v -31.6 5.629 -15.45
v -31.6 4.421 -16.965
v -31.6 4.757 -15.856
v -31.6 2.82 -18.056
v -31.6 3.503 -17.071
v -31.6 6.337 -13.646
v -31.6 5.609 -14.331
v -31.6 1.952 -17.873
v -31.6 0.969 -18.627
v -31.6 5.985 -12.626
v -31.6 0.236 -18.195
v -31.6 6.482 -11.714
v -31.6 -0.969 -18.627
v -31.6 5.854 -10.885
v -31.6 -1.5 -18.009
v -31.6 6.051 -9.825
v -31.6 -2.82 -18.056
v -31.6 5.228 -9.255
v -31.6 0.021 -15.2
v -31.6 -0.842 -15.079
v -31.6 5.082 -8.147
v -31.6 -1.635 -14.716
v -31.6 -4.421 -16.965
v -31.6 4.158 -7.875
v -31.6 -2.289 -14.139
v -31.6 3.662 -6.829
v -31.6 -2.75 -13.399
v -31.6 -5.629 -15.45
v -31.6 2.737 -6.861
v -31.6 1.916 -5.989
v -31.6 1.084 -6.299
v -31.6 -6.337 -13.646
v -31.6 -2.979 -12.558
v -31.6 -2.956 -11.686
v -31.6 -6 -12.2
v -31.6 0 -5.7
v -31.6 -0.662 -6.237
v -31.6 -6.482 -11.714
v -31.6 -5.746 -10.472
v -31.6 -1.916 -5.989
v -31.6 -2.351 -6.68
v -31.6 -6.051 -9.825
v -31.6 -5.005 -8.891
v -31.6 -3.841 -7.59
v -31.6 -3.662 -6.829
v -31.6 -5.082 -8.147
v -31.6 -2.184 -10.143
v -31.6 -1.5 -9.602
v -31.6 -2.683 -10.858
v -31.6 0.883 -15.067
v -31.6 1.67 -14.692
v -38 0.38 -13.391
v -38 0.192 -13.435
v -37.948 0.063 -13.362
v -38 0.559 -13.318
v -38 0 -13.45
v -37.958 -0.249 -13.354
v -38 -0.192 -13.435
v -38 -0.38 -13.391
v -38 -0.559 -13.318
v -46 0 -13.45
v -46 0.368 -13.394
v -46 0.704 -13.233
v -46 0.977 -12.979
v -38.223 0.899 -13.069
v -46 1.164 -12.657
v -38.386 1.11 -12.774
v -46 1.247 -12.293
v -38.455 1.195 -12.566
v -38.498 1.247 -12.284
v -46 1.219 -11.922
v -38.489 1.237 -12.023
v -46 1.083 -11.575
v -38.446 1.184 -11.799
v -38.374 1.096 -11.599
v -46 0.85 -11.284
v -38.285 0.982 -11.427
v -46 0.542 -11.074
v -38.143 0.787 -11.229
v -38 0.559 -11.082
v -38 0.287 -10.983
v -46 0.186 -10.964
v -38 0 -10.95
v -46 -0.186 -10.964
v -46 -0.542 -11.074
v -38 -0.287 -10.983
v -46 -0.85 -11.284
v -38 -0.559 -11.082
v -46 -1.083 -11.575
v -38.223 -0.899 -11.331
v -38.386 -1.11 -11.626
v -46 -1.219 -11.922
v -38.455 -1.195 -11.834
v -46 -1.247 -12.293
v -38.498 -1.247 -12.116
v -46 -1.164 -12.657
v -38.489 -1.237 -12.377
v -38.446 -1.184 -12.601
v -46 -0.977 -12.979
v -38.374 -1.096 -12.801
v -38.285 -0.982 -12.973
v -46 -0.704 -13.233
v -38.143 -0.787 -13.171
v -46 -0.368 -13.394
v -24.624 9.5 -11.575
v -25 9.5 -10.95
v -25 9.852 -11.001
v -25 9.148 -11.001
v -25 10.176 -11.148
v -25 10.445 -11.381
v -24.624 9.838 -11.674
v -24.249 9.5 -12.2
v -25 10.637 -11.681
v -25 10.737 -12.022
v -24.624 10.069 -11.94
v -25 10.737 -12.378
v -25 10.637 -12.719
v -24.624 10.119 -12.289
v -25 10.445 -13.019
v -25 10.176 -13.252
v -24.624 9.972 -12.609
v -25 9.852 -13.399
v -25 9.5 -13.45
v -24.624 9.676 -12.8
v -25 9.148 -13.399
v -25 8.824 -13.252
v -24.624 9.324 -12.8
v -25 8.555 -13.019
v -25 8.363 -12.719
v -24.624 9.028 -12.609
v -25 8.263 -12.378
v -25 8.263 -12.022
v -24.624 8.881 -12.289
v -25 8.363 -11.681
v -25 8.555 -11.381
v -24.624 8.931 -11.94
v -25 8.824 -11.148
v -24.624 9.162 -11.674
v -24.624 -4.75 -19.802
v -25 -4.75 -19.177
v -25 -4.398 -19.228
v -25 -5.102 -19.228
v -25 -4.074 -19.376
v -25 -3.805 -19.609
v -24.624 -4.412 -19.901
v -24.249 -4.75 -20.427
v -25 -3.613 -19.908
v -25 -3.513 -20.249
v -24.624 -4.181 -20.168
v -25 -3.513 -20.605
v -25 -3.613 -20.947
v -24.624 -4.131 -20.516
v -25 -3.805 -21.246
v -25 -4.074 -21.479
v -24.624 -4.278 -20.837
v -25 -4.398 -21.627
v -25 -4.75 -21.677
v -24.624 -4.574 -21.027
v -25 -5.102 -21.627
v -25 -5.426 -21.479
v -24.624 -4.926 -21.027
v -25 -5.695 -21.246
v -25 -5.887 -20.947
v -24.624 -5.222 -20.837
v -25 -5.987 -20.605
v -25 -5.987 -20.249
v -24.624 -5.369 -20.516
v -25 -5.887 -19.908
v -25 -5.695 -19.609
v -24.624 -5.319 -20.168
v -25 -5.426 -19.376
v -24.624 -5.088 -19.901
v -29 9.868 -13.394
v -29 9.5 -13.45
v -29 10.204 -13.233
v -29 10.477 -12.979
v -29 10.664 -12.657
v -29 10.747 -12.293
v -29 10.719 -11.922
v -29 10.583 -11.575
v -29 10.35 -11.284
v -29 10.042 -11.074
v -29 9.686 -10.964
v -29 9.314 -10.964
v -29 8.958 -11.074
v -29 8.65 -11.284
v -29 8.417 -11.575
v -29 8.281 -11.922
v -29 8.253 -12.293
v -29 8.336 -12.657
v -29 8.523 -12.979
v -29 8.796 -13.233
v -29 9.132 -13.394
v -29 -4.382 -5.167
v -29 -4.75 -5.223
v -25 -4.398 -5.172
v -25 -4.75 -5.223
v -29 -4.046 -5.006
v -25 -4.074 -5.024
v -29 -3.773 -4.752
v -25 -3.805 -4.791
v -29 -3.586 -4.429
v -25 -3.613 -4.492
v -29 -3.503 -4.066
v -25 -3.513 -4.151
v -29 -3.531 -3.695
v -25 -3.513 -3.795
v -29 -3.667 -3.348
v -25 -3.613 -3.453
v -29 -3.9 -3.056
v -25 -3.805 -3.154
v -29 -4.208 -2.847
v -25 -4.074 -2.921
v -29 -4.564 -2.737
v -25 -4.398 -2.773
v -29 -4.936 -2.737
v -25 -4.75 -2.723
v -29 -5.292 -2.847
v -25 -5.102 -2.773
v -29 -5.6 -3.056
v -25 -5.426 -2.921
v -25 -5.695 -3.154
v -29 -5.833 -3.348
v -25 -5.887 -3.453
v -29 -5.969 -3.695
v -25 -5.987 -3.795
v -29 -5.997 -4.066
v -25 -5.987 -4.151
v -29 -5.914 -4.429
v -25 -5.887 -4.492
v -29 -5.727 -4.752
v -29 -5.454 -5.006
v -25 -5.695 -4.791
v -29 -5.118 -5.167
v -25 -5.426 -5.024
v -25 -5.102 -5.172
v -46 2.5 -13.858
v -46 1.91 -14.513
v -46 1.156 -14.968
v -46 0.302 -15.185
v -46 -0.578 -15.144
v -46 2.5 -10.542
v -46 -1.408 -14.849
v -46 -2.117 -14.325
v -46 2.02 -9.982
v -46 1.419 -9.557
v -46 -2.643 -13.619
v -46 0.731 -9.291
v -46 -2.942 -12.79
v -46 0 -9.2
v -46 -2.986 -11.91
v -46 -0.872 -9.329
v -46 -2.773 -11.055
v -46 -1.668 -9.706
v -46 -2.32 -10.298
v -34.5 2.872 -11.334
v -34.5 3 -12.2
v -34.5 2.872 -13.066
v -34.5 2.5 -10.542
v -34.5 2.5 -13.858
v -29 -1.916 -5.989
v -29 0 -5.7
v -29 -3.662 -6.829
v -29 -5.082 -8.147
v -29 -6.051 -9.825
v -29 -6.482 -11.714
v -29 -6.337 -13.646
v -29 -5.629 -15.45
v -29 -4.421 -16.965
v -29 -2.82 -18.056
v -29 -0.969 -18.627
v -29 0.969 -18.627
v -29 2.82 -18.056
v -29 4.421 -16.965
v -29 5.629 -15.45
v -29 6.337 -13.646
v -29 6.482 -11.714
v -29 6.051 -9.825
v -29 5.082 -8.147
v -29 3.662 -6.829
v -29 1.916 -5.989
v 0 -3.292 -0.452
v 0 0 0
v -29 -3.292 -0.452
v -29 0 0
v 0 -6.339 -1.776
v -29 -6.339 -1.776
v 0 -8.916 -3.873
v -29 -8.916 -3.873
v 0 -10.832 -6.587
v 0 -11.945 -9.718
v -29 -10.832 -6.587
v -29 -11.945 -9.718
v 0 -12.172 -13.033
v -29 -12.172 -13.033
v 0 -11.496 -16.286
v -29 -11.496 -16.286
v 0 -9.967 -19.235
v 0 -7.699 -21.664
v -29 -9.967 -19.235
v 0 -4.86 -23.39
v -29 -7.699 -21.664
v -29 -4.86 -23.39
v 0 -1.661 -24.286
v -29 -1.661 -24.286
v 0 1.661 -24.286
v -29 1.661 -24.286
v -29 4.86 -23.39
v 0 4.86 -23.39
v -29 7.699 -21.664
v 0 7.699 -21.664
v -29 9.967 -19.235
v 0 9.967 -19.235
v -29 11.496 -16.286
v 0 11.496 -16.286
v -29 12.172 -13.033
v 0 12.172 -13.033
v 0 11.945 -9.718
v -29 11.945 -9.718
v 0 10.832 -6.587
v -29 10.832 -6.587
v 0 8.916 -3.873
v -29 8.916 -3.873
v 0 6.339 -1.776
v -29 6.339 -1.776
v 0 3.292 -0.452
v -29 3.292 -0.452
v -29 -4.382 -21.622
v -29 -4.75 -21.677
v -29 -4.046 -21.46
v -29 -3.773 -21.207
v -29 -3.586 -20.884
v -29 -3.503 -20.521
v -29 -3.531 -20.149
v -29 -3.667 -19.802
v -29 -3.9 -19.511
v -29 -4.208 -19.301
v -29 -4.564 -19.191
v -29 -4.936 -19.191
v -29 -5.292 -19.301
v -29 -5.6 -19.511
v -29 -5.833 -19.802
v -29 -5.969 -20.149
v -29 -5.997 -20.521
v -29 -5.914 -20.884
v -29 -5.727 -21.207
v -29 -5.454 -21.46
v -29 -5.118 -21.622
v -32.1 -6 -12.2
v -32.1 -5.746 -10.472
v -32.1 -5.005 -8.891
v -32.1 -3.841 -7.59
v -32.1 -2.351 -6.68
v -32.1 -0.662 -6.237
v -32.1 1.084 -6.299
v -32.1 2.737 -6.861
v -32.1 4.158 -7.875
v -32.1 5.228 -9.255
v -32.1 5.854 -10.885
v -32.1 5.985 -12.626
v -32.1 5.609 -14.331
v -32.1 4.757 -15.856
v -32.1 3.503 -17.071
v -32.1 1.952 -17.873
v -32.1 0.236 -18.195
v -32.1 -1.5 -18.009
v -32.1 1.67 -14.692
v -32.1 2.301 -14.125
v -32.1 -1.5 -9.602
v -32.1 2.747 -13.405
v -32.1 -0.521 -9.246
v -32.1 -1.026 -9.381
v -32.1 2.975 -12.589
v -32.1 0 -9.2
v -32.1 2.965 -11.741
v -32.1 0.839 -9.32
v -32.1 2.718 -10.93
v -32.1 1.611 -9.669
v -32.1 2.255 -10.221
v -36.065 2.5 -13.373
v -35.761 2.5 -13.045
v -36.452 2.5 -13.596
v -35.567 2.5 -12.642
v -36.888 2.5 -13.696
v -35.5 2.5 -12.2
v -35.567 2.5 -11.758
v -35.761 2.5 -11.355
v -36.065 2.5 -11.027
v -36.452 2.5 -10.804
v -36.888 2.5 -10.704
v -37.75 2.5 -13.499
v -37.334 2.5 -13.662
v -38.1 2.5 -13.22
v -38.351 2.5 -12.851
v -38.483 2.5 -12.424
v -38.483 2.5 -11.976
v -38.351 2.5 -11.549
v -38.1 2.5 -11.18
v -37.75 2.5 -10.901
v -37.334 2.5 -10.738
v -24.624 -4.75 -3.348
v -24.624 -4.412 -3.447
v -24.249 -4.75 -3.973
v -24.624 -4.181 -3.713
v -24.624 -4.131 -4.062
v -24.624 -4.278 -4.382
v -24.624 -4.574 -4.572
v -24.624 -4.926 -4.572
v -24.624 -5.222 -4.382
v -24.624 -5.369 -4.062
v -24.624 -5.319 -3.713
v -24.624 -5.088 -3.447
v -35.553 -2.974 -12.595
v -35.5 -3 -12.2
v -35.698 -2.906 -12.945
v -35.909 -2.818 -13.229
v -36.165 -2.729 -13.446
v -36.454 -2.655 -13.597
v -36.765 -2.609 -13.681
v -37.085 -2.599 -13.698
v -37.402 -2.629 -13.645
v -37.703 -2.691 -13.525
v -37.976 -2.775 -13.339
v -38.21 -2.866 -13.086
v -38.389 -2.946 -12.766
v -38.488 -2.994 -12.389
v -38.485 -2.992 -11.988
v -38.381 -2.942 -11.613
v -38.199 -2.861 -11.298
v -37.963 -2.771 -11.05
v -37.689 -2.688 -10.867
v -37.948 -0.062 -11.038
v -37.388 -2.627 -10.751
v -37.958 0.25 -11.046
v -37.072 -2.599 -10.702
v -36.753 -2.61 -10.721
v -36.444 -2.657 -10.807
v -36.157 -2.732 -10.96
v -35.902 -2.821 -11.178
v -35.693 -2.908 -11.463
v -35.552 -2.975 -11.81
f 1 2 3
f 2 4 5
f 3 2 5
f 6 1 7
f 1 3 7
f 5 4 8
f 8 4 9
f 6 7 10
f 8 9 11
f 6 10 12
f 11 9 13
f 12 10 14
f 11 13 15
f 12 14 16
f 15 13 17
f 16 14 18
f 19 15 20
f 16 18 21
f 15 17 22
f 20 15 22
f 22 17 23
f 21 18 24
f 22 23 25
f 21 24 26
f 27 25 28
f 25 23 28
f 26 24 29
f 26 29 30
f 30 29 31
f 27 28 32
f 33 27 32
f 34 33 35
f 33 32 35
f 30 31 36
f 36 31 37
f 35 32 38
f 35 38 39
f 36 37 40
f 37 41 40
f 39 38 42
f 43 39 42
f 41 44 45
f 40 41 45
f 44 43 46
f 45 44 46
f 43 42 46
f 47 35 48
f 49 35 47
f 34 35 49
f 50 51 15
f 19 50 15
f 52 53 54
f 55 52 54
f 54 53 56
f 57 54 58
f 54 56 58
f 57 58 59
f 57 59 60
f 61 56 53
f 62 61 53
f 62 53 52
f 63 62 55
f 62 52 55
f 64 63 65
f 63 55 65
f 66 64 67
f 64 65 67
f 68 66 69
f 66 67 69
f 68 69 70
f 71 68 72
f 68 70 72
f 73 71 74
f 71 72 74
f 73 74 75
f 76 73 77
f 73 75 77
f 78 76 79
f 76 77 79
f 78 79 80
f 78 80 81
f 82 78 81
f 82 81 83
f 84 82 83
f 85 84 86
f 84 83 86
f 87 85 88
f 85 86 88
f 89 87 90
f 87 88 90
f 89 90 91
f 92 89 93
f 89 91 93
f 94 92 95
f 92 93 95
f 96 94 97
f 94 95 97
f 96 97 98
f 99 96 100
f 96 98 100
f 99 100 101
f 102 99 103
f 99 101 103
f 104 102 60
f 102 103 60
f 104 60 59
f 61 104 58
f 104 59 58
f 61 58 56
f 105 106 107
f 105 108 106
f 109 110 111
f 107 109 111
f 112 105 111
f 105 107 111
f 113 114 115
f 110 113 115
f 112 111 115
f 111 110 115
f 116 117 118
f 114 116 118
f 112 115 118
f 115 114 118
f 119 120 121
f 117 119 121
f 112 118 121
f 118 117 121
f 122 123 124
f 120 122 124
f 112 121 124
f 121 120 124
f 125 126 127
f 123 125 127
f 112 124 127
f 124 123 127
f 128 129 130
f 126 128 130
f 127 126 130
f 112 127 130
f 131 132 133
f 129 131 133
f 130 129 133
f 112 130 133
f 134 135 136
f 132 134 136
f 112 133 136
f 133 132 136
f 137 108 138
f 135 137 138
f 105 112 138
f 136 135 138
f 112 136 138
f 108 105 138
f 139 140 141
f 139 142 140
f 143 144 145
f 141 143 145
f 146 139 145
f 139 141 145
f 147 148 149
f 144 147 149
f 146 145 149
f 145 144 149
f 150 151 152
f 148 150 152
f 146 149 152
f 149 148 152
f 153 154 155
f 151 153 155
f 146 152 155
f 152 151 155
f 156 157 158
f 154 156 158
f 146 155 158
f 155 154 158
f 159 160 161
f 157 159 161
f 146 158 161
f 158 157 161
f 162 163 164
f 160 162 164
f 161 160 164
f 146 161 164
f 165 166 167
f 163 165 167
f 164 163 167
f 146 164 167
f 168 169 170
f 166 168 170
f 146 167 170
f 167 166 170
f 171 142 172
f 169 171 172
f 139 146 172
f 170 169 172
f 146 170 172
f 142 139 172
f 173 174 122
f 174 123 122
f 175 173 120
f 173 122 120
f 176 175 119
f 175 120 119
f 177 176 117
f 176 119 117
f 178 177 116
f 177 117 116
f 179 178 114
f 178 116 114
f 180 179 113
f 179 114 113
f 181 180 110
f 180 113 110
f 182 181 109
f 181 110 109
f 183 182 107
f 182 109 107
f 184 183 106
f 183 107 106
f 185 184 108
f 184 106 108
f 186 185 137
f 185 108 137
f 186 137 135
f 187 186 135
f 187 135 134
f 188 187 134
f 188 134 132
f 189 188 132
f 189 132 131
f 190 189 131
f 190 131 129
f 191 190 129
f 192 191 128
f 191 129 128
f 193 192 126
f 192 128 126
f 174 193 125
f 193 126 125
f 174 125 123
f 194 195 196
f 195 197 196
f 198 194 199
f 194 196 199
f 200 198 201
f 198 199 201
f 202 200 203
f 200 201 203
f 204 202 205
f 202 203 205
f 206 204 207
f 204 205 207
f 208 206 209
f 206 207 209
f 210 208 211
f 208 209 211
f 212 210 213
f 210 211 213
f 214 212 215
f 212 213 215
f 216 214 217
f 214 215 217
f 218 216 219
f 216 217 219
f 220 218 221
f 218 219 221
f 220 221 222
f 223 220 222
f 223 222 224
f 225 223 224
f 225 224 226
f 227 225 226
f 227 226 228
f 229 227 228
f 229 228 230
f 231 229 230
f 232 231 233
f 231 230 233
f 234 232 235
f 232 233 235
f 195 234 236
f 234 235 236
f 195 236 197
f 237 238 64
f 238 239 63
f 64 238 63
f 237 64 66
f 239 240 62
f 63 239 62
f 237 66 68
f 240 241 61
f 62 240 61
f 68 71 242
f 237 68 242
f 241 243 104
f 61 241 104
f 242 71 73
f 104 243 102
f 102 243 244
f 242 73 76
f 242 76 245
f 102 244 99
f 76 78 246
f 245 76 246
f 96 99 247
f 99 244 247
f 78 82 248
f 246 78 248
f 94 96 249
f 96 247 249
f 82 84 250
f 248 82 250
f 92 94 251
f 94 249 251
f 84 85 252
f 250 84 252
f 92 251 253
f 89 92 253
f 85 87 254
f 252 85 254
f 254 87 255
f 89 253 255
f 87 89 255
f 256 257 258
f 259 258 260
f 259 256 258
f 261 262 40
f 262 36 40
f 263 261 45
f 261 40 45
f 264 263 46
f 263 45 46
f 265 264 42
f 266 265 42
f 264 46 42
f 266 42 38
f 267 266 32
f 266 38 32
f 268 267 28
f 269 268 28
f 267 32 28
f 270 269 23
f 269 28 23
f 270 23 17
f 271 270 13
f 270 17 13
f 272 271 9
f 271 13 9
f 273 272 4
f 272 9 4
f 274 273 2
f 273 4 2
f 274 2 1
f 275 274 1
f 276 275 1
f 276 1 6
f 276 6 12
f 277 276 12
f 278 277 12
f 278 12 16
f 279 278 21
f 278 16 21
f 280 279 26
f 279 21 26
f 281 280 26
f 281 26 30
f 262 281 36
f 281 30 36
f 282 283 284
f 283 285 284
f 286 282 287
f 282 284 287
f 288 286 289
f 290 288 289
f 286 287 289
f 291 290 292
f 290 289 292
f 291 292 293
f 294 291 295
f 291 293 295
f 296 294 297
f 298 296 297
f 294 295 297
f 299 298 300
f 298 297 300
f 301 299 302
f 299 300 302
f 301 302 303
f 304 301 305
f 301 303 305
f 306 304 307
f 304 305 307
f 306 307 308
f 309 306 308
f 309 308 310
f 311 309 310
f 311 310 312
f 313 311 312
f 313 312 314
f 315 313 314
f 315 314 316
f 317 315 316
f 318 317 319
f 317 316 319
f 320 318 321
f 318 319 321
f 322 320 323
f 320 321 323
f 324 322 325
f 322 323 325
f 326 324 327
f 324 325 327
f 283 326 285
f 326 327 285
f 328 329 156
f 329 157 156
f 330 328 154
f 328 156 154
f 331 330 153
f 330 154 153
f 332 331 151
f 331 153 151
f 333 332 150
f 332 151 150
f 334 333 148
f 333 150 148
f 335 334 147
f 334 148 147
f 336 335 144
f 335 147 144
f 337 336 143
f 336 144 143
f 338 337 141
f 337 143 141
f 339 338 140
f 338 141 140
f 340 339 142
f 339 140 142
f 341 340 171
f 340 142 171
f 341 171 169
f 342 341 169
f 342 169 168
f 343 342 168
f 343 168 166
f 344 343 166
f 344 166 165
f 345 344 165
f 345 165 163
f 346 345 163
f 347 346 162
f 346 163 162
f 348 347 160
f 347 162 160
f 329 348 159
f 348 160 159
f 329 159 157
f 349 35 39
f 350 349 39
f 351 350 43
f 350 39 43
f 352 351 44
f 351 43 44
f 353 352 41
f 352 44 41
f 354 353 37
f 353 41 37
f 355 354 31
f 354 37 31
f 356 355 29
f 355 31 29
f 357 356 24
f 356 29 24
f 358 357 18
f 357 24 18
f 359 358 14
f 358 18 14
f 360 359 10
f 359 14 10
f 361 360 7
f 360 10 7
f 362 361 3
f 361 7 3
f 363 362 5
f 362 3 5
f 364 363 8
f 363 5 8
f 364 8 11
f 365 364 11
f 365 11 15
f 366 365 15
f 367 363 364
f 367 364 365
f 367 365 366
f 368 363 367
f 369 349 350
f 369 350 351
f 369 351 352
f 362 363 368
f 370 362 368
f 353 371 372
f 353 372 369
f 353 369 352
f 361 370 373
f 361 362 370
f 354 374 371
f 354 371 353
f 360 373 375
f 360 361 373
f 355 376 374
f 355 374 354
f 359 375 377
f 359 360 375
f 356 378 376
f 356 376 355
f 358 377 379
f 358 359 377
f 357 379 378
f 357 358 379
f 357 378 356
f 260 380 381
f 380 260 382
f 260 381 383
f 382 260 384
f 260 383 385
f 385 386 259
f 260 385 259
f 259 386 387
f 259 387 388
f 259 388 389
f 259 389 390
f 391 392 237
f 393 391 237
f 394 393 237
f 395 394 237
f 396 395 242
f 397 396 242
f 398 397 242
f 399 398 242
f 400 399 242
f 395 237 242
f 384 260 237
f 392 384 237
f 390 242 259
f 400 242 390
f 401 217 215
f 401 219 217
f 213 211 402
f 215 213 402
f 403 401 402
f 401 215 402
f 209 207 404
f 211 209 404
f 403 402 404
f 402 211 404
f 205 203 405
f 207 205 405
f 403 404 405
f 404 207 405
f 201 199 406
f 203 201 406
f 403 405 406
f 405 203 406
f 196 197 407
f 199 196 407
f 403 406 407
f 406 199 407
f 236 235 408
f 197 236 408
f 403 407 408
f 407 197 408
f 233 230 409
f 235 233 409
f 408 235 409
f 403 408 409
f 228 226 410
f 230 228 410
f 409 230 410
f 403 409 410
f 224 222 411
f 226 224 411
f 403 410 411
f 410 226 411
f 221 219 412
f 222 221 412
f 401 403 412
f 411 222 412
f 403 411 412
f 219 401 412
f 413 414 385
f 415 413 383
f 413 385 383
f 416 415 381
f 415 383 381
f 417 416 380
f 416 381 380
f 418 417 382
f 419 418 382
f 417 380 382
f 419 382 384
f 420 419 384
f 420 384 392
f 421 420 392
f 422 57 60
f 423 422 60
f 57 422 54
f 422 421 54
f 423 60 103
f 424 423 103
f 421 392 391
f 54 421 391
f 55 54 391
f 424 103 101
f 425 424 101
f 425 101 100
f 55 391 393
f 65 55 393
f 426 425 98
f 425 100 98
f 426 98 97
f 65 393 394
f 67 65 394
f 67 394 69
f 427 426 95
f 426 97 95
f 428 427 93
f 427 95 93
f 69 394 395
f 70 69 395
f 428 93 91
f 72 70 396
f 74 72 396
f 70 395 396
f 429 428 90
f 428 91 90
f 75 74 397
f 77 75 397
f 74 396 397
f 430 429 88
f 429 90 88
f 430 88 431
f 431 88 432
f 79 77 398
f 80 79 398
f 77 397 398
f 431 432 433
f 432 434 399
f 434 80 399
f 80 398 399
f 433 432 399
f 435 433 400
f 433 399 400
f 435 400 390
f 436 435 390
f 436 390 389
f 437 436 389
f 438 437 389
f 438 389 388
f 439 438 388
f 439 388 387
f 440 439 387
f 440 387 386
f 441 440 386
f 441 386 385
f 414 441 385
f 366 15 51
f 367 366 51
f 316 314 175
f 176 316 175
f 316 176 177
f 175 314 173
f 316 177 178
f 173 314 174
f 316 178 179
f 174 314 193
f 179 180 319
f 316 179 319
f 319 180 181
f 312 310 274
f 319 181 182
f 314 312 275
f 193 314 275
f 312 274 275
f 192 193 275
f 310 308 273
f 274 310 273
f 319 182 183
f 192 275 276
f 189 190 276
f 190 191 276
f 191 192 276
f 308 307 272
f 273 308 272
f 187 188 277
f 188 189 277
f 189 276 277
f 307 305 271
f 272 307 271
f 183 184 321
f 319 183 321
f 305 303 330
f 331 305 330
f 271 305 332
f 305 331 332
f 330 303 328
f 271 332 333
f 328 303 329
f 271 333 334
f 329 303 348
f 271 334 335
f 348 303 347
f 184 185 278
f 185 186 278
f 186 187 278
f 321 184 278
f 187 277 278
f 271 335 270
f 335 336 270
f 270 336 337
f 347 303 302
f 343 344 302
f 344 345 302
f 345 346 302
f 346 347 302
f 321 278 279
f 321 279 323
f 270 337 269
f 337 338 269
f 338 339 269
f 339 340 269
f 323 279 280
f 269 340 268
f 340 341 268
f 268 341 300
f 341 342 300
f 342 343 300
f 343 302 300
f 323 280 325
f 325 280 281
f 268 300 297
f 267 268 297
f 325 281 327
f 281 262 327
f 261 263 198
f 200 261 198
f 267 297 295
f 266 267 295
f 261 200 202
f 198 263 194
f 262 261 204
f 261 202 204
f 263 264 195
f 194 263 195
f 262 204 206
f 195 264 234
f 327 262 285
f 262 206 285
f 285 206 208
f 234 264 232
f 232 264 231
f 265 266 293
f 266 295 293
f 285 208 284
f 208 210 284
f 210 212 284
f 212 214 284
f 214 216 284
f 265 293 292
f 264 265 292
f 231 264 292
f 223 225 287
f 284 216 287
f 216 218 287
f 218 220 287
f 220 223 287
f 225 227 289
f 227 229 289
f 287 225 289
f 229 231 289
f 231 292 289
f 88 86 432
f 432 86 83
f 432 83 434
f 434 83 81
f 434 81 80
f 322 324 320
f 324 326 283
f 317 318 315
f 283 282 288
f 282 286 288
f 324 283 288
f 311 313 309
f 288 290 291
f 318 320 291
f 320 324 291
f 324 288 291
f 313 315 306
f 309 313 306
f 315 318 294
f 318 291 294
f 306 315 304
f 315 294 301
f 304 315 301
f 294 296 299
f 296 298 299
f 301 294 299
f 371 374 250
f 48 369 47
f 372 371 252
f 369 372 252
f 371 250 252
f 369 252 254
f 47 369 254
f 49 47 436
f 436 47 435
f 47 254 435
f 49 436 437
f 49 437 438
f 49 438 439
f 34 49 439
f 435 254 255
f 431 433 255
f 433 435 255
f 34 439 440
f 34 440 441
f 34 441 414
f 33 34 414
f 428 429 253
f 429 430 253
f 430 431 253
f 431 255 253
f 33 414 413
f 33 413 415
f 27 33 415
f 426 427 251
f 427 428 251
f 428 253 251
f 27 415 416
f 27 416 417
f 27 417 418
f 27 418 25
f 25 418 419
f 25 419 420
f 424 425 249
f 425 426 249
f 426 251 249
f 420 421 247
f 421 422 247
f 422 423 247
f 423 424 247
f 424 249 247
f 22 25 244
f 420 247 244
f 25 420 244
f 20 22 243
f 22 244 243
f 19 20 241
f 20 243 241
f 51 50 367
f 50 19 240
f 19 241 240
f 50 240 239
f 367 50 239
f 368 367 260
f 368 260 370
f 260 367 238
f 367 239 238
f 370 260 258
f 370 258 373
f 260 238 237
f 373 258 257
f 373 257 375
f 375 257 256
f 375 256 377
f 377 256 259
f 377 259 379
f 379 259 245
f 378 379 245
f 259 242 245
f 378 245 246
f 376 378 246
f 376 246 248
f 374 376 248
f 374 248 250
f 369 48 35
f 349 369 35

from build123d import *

# Parameters (mm, degrees)
CUT_EXTRUDE_3_DEPTH    = 11.5
HOLE_WIZARD_M3_1_D     = 2.5
HOLE_WIZARD_M3_1_DEPTH = 8
HOLE_WIZARD_M3_1_TIP   = 0.751075774
SKETCH_12_R            = 1.5
CUT_EXTRUDE_4_DEPTH    = 11.5
HOLE_WIZARD_M3_2_D     = 2.5
HOLE_WIZARD_M3_2_DEPTH = 4
HOLE_WIZARD_M3_2_TIP   = 0.751075774
EXTRUDE_1_DEPTH        = 0.5


with BuildPart() as part:
    # 草图1 → 旋转1 (revolve)
    with BuildSketch(Plane(origin=(0, 0, 0), x_dir=(1, 0, 0), z_dir=(0, 1, 0))):
        Polygon((0, 0), (-29, 0), (-29, 5.7), (-31.6, 5.7), (-31.6, 9.2), (-46, 9.2), (-46, 12.2), (0, 12.2), align=None)
    revolve(axis=Axis((-46, 0, -12.2), (1, 0, 0)))

    # 草图9 → 切除-拉伸3 (cut)
    with BuildSketch(Plane.ZY.offset(46)):
        with BuildLine():
            Line((-12.2, 2.5), (-10.541687605, 2.5))
            ThreePointArc((-10.541687605, 2.5), (-12.2, 3), (-13.858312395, 2.5))
            Line((-13.858312395, 2.5), (-12.2, 2.5))
        make_face()
    extrude(amount=-CUT_EXTRUDE_3_DEPTH, mode=Mode.SUBTRACT)

    # M3 螺纹孔1
    with Locations(Plane.ZY.offset(46)):
        with Locations((-12.2, 0)):
            Hole(HOLE_WIZARD_M3_1_D / 2, depth=HOLE_WIZARD_M3_1_DEPTH)
            with Locations((0, 0, -(HOLE_WIZARD_M3_1_DEPTH + HOLE_WIZARD_M3_1_TIP / 2))):  # 118° drill point
                Cone(0, HOLE_WIZARD_M3_1_D / 2, HOLE_WIZARD_M3_1_TIP, mode=Mode.SUBTRACT)

    # 草图12 → 切除-拉伸4 (cut)
    with BuildSketch(Plane(origin=(0, 2.5, 0), x_dir=(1, 0, 0), z_dir=(0, 1, 0))):
        with Locations((-37, 12.2)):
            Circle(SKETCH_12_R)
    extrude(amount=-CUT_EXTRUDE_4_DEPTH, mode=Mode.SUBTRACT)

    # M3 螺纹孔2
    with Locations(Plane.ZY.offset(29)):
        with Locations((-12.2, 9.5), (-20.427241336, -4.75), (-3.972758664, -4.75)):
            Hole(HOLE_WIZARD_M3_2_D / 2, depth=HOLE_WIZARD_M3_2_DEPTH)
            with Locations((0, 0, -(HOLE_WIZARD_M3_2_DEPTH + HOLE_WIZARD_M3_2_TIP / 2))):  # 118° drill point
                Cone(0, HOLE_WIZARD_M3_2_D / 2, HOLE_WIZARD_M3_2_TIP, mode=Mode.SUBTRACT)

    # 草图16 → 凸台-拉伸1 (add)
    with BuildSketch(Plane.ZY.offset(31.6)):
        with BuildLine():
            Line((-9.601923789, -1.5), (-12.2, -6))
            ThreePointArc((-12.2, -6), (-8.525765386, 4.74341649), (-18.009475019, -1.5))
            Line((-18.009475019, -1.5), (-14.69206472, 1.670213589))
            ThreePointArc((-14.69206472, 1.670213589), (-10.614007201, 2.546493048), (-9.601923789, -1.5))
        make_face()
    extrude(amount=EXTRUDE_1_DEPTH)


solid = part.part
